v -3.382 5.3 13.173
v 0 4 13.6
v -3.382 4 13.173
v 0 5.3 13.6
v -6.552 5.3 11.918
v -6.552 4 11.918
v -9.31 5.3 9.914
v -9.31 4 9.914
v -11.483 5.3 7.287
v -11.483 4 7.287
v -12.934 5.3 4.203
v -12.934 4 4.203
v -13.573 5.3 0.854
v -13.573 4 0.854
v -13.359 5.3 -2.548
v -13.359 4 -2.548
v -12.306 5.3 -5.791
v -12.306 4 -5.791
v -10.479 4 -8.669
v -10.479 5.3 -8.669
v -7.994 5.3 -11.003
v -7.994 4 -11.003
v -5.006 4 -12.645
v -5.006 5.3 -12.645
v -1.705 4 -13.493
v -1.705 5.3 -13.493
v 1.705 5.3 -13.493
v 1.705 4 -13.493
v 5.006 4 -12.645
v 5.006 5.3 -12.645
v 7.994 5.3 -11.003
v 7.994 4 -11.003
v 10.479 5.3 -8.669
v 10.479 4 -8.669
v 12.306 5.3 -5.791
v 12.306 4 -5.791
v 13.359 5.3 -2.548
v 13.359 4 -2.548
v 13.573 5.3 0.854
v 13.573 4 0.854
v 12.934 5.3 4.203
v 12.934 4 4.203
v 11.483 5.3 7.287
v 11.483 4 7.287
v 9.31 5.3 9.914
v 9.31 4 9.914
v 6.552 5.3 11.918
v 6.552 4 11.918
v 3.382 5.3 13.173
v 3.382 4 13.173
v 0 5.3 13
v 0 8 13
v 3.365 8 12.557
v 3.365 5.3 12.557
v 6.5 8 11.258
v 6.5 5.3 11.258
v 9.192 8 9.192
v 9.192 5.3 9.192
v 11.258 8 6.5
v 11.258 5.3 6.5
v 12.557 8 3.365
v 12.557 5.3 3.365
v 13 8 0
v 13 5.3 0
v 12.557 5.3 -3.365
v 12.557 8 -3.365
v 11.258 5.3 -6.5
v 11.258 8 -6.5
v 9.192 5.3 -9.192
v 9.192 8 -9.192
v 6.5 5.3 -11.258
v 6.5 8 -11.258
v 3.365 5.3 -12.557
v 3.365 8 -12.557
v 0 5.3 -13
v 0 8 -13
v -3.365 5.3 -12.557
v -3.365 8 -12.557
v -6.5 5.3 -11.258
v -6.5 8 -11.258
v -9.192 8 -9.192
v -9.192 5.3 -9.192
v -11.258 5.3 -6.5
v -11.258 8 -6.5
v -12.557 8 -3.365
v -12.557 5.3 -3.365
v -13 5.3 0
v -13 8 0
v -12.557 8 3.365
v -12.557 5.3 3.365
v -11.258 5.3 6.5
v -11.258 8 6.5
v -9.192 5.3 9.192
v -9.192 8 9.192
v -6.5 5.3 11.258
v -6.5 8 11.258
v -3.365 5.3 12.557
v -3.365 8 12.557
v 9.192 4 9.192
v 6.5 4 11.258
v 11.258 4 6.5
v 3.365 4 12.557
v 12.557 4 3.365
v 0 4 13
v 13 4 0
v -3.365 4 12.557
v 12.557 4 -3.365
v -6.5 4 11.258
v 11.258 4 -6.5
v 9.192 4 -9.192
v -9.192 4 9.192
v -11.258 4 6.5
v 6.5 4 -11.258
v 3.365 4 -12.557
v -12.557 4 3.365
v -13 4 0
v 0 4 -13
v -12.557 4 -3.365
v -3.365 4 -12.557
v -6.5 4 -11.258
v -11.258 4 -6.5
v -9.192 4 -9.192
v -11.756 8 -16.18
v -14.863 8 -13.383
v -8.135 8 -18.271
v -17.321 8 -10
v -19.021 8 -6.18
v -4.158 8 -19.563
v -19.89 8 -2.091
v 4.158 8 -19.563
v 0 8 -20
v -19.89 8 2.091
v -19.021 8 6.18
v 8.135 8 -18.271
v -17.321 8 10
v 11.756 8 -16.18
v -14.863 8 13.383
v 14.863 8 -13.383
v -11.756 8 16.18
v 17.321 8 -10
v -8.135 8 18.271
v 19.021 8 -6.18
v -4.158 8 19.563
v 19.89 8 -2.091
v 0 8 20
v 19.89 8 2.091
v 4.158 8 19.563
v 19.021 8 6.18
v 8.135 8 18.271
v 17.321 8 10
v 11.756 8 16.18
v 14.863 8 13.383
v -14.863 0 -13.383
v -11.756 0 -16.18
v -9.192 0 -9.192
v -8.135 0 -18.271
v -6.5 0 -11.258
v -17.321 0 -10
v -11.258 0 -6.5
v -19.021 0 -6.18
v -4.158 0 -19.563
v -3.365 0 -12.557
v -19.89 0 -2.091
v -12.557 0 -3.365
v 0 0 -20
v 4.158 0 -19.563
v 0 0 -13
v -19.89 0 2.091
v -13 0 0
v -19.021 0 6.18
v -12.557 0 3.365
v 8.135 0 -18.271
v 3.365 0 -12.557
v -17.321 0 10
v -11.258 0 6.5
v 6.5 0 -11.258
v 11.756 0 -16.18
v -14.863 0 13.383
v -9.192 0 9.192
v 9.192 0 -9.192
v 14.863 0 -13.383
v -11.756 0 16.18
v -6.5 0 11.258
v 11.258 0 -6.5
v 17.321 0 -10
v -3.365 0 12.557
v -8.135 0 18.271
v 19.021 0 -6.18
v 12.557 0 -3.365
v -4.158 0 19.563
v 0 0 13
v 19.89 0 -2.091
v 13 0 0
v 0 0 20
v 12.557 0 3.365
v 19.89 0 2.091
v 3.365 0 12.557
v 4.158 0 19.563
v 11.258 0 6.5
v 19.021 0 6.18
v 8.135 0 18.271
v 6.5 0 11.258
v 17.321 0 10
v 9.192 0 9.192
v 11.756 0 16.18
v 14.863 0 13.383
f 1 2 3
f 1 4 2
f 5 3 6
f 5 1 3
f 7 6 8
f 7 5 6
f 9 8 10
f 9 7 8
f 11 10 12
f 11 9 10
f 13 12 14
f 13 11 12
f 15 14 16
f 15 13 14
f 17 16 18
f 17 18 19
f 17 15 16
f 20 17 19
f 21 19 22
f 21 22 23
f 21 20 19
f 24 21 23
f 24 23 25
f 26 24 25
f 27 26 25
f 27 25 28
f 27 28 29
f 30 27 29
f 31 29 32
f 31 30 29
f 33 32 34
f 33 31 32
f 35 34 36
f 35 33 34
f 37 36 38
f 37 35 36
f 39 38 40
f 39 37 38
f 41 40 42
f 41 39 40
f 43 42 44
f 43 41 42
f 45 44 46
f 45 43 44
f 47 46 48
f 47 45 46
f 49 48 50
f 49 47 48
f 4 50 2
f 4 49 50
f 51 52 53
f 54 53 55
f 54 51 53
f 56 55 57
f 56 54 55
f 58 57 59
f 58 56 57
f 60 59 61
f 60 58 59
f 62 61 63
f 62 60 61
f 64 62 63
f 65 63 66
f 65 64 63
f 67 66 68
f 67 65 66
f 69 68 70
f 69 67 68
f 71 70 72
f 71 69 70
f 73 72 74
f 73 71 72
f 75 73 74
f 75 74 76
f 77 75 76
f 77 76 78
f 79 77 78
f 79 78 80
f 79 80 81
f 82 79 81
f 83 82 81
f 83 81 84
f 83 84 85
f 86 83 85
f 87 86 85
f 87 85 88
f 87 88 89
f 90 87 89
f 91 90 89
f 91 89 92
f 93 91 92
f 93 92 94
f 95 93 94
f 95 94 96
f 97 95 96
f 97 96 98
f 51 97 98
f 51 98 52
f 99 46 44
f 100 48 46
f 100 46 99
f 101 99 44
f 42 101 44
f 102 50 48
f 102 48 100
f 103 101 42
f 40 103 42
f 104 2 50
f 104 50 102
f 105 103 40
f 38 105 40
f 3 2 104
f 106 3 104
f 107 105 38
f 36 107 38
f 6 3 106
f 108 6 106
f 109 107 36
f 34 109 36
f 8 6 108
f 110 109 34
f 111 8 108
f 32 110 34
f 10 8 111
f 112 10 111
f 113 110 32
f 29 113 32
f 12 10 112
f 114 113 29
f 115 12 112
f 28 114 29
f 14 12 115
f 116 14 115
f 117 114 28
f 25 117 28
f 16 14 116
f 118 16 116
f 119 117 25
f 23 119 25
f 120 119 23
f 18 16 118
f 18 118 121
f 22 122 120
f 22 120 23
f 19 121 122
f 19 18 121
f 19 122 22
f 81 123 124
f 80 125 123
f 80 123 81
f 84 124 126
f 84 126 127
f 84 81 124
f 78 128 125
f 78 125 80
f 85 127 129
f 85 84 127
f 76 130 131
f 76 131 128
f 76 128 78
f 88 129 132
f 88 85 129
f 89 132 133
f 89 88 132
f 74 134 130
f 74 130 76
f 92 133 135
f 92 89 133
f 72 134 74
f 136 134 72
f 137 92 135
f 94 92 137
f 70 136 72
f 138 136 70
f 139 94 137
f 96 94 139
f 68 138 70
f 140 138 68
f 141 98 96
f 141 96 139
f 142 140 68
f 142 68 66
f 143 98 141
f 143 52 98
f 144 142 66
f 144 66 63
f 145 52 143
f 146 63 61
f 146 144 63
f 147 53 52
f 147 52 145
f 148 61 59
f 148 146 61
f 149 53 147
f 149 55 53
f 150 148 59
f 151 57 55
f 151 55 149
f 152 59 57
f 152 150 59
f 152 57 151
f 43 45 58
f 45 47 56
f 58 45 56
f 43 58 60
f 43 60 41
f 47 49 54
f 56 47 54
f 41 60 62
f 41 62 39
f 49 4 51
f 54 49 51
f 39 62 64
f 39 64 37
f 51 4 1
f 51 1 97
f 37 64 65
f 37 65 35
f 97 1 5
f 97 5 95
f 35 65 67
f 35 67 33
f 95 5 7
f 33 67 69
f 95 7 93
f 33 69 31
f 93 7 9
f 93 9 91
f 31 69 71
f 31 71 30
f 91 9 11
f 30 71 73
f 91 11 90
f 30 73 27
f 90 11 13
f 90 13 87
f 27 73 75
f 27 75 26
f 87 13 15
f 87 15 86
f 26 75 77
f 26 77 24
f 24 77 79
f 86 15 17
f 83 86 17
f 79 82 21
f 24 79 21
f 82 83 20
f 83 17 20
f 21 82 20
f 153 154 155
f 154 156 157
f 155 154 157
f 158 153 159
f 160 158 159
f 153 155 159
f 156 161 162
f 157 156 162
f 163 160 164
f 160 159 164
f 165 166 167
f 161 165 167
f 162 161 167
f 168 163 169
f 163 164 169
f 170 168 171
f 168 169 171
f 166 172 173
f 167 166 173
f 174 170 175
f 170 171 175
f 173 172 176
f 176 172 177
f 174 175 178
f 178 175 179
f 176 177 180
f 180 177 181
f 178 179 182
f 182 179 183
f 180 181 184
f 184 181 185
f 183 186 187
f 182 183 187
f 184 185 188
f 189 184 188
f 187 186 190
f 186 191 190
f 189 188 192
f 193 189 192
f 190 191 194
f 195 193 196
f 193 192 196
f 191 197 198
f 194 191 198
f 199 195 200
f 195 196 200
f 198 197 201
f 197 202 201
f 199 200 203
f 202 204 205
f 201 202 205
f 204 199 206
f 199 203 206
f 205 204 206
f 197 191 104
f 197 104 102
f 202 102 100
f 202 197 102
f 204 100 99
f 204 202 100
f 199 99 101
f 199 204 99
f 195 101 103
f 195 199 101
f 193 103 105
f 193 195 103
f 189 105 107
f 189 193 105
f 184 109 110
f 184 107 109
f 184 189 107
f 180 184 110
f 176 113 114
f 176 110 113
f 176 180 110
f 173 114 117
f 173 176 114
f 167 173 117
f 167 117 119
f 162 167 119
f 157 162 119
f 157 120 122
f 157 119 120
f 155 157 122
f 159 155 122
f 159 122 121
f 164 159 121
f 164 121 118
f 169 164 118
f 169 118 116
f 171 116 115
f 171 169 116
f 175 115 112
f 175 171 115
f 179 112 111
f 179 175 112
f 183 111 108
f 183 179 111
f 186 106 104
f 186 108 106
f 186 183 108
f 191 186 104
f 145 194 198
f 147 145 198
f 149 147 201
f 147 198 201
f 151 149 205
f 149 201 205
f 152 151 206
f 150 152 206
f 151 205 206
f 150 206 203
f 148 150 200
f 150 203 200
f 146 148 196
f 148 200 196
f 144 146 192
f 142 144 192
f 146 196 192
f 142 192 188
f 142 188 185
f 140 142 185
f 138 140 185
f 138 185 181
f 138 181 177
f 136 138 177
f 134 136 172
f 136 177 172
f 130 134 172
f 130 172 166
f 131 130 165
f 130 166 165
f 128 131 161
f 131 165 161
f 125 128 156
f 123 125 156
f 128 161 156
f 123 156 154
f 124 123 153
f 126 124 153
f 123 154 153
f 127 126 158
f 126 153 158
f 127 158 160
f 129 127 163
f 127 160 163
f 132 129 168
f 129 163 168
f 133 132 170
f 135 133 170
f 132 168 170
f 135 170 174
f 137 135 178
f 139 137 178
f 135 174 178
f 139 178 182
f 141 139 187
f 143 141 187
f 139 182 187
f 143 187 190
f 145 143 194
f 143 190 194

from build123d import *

# Parameters (mm, degrees)
SKETCH1_R           = 20
SKETCH1_R_2         = 13
BOSS_EXTRUDE1_DEPTH = 8
SKETCH2_W           = 0.6
SKETCH2_H           = 1.3


with BuildPart() as part:
    # Sketch1 → Boss-Extrude1 (new body)
    with BuildSketch(Plane(origin=(0, 0, 0), x_dir=(1, 0, 0), z_dir=(0, 1, 0))):
        with Locations(Location((0, 0, 0), (0, 0, 270))):
            Circle(SKETCH1_R)
        with Locations(Location((0, 0, 0), (0, 0, 270))):
            Circle(SKETCH1_R_2, mode=Mode.SUBTRACT)
    extrude(amount=BOSS_EXTRUDE1_DEPTH)

    # Sketch2 → Cut-Revolve1 (revolve, cut)
    with BuildSketch(Plane(origin=(0, 0, 0), x_dir=(0, 0, -1), z_dir=(1, 0, 0)), mode=Mode.PRIVATE) as cut_revolve1_sk:
        with Locations((13.3, 4.65)):
            Rectangle(SKETCH2_W, SKETCH2_H)
    revolve(cut_revolve1_sk.sketch.rotate(Axis((0, 8, 0), (0, -1, 0)), 180), axis=Axis((0, 8, 0), (0, -1, 0)), mode=Mode.SUBTRACT)


solid = part.part
